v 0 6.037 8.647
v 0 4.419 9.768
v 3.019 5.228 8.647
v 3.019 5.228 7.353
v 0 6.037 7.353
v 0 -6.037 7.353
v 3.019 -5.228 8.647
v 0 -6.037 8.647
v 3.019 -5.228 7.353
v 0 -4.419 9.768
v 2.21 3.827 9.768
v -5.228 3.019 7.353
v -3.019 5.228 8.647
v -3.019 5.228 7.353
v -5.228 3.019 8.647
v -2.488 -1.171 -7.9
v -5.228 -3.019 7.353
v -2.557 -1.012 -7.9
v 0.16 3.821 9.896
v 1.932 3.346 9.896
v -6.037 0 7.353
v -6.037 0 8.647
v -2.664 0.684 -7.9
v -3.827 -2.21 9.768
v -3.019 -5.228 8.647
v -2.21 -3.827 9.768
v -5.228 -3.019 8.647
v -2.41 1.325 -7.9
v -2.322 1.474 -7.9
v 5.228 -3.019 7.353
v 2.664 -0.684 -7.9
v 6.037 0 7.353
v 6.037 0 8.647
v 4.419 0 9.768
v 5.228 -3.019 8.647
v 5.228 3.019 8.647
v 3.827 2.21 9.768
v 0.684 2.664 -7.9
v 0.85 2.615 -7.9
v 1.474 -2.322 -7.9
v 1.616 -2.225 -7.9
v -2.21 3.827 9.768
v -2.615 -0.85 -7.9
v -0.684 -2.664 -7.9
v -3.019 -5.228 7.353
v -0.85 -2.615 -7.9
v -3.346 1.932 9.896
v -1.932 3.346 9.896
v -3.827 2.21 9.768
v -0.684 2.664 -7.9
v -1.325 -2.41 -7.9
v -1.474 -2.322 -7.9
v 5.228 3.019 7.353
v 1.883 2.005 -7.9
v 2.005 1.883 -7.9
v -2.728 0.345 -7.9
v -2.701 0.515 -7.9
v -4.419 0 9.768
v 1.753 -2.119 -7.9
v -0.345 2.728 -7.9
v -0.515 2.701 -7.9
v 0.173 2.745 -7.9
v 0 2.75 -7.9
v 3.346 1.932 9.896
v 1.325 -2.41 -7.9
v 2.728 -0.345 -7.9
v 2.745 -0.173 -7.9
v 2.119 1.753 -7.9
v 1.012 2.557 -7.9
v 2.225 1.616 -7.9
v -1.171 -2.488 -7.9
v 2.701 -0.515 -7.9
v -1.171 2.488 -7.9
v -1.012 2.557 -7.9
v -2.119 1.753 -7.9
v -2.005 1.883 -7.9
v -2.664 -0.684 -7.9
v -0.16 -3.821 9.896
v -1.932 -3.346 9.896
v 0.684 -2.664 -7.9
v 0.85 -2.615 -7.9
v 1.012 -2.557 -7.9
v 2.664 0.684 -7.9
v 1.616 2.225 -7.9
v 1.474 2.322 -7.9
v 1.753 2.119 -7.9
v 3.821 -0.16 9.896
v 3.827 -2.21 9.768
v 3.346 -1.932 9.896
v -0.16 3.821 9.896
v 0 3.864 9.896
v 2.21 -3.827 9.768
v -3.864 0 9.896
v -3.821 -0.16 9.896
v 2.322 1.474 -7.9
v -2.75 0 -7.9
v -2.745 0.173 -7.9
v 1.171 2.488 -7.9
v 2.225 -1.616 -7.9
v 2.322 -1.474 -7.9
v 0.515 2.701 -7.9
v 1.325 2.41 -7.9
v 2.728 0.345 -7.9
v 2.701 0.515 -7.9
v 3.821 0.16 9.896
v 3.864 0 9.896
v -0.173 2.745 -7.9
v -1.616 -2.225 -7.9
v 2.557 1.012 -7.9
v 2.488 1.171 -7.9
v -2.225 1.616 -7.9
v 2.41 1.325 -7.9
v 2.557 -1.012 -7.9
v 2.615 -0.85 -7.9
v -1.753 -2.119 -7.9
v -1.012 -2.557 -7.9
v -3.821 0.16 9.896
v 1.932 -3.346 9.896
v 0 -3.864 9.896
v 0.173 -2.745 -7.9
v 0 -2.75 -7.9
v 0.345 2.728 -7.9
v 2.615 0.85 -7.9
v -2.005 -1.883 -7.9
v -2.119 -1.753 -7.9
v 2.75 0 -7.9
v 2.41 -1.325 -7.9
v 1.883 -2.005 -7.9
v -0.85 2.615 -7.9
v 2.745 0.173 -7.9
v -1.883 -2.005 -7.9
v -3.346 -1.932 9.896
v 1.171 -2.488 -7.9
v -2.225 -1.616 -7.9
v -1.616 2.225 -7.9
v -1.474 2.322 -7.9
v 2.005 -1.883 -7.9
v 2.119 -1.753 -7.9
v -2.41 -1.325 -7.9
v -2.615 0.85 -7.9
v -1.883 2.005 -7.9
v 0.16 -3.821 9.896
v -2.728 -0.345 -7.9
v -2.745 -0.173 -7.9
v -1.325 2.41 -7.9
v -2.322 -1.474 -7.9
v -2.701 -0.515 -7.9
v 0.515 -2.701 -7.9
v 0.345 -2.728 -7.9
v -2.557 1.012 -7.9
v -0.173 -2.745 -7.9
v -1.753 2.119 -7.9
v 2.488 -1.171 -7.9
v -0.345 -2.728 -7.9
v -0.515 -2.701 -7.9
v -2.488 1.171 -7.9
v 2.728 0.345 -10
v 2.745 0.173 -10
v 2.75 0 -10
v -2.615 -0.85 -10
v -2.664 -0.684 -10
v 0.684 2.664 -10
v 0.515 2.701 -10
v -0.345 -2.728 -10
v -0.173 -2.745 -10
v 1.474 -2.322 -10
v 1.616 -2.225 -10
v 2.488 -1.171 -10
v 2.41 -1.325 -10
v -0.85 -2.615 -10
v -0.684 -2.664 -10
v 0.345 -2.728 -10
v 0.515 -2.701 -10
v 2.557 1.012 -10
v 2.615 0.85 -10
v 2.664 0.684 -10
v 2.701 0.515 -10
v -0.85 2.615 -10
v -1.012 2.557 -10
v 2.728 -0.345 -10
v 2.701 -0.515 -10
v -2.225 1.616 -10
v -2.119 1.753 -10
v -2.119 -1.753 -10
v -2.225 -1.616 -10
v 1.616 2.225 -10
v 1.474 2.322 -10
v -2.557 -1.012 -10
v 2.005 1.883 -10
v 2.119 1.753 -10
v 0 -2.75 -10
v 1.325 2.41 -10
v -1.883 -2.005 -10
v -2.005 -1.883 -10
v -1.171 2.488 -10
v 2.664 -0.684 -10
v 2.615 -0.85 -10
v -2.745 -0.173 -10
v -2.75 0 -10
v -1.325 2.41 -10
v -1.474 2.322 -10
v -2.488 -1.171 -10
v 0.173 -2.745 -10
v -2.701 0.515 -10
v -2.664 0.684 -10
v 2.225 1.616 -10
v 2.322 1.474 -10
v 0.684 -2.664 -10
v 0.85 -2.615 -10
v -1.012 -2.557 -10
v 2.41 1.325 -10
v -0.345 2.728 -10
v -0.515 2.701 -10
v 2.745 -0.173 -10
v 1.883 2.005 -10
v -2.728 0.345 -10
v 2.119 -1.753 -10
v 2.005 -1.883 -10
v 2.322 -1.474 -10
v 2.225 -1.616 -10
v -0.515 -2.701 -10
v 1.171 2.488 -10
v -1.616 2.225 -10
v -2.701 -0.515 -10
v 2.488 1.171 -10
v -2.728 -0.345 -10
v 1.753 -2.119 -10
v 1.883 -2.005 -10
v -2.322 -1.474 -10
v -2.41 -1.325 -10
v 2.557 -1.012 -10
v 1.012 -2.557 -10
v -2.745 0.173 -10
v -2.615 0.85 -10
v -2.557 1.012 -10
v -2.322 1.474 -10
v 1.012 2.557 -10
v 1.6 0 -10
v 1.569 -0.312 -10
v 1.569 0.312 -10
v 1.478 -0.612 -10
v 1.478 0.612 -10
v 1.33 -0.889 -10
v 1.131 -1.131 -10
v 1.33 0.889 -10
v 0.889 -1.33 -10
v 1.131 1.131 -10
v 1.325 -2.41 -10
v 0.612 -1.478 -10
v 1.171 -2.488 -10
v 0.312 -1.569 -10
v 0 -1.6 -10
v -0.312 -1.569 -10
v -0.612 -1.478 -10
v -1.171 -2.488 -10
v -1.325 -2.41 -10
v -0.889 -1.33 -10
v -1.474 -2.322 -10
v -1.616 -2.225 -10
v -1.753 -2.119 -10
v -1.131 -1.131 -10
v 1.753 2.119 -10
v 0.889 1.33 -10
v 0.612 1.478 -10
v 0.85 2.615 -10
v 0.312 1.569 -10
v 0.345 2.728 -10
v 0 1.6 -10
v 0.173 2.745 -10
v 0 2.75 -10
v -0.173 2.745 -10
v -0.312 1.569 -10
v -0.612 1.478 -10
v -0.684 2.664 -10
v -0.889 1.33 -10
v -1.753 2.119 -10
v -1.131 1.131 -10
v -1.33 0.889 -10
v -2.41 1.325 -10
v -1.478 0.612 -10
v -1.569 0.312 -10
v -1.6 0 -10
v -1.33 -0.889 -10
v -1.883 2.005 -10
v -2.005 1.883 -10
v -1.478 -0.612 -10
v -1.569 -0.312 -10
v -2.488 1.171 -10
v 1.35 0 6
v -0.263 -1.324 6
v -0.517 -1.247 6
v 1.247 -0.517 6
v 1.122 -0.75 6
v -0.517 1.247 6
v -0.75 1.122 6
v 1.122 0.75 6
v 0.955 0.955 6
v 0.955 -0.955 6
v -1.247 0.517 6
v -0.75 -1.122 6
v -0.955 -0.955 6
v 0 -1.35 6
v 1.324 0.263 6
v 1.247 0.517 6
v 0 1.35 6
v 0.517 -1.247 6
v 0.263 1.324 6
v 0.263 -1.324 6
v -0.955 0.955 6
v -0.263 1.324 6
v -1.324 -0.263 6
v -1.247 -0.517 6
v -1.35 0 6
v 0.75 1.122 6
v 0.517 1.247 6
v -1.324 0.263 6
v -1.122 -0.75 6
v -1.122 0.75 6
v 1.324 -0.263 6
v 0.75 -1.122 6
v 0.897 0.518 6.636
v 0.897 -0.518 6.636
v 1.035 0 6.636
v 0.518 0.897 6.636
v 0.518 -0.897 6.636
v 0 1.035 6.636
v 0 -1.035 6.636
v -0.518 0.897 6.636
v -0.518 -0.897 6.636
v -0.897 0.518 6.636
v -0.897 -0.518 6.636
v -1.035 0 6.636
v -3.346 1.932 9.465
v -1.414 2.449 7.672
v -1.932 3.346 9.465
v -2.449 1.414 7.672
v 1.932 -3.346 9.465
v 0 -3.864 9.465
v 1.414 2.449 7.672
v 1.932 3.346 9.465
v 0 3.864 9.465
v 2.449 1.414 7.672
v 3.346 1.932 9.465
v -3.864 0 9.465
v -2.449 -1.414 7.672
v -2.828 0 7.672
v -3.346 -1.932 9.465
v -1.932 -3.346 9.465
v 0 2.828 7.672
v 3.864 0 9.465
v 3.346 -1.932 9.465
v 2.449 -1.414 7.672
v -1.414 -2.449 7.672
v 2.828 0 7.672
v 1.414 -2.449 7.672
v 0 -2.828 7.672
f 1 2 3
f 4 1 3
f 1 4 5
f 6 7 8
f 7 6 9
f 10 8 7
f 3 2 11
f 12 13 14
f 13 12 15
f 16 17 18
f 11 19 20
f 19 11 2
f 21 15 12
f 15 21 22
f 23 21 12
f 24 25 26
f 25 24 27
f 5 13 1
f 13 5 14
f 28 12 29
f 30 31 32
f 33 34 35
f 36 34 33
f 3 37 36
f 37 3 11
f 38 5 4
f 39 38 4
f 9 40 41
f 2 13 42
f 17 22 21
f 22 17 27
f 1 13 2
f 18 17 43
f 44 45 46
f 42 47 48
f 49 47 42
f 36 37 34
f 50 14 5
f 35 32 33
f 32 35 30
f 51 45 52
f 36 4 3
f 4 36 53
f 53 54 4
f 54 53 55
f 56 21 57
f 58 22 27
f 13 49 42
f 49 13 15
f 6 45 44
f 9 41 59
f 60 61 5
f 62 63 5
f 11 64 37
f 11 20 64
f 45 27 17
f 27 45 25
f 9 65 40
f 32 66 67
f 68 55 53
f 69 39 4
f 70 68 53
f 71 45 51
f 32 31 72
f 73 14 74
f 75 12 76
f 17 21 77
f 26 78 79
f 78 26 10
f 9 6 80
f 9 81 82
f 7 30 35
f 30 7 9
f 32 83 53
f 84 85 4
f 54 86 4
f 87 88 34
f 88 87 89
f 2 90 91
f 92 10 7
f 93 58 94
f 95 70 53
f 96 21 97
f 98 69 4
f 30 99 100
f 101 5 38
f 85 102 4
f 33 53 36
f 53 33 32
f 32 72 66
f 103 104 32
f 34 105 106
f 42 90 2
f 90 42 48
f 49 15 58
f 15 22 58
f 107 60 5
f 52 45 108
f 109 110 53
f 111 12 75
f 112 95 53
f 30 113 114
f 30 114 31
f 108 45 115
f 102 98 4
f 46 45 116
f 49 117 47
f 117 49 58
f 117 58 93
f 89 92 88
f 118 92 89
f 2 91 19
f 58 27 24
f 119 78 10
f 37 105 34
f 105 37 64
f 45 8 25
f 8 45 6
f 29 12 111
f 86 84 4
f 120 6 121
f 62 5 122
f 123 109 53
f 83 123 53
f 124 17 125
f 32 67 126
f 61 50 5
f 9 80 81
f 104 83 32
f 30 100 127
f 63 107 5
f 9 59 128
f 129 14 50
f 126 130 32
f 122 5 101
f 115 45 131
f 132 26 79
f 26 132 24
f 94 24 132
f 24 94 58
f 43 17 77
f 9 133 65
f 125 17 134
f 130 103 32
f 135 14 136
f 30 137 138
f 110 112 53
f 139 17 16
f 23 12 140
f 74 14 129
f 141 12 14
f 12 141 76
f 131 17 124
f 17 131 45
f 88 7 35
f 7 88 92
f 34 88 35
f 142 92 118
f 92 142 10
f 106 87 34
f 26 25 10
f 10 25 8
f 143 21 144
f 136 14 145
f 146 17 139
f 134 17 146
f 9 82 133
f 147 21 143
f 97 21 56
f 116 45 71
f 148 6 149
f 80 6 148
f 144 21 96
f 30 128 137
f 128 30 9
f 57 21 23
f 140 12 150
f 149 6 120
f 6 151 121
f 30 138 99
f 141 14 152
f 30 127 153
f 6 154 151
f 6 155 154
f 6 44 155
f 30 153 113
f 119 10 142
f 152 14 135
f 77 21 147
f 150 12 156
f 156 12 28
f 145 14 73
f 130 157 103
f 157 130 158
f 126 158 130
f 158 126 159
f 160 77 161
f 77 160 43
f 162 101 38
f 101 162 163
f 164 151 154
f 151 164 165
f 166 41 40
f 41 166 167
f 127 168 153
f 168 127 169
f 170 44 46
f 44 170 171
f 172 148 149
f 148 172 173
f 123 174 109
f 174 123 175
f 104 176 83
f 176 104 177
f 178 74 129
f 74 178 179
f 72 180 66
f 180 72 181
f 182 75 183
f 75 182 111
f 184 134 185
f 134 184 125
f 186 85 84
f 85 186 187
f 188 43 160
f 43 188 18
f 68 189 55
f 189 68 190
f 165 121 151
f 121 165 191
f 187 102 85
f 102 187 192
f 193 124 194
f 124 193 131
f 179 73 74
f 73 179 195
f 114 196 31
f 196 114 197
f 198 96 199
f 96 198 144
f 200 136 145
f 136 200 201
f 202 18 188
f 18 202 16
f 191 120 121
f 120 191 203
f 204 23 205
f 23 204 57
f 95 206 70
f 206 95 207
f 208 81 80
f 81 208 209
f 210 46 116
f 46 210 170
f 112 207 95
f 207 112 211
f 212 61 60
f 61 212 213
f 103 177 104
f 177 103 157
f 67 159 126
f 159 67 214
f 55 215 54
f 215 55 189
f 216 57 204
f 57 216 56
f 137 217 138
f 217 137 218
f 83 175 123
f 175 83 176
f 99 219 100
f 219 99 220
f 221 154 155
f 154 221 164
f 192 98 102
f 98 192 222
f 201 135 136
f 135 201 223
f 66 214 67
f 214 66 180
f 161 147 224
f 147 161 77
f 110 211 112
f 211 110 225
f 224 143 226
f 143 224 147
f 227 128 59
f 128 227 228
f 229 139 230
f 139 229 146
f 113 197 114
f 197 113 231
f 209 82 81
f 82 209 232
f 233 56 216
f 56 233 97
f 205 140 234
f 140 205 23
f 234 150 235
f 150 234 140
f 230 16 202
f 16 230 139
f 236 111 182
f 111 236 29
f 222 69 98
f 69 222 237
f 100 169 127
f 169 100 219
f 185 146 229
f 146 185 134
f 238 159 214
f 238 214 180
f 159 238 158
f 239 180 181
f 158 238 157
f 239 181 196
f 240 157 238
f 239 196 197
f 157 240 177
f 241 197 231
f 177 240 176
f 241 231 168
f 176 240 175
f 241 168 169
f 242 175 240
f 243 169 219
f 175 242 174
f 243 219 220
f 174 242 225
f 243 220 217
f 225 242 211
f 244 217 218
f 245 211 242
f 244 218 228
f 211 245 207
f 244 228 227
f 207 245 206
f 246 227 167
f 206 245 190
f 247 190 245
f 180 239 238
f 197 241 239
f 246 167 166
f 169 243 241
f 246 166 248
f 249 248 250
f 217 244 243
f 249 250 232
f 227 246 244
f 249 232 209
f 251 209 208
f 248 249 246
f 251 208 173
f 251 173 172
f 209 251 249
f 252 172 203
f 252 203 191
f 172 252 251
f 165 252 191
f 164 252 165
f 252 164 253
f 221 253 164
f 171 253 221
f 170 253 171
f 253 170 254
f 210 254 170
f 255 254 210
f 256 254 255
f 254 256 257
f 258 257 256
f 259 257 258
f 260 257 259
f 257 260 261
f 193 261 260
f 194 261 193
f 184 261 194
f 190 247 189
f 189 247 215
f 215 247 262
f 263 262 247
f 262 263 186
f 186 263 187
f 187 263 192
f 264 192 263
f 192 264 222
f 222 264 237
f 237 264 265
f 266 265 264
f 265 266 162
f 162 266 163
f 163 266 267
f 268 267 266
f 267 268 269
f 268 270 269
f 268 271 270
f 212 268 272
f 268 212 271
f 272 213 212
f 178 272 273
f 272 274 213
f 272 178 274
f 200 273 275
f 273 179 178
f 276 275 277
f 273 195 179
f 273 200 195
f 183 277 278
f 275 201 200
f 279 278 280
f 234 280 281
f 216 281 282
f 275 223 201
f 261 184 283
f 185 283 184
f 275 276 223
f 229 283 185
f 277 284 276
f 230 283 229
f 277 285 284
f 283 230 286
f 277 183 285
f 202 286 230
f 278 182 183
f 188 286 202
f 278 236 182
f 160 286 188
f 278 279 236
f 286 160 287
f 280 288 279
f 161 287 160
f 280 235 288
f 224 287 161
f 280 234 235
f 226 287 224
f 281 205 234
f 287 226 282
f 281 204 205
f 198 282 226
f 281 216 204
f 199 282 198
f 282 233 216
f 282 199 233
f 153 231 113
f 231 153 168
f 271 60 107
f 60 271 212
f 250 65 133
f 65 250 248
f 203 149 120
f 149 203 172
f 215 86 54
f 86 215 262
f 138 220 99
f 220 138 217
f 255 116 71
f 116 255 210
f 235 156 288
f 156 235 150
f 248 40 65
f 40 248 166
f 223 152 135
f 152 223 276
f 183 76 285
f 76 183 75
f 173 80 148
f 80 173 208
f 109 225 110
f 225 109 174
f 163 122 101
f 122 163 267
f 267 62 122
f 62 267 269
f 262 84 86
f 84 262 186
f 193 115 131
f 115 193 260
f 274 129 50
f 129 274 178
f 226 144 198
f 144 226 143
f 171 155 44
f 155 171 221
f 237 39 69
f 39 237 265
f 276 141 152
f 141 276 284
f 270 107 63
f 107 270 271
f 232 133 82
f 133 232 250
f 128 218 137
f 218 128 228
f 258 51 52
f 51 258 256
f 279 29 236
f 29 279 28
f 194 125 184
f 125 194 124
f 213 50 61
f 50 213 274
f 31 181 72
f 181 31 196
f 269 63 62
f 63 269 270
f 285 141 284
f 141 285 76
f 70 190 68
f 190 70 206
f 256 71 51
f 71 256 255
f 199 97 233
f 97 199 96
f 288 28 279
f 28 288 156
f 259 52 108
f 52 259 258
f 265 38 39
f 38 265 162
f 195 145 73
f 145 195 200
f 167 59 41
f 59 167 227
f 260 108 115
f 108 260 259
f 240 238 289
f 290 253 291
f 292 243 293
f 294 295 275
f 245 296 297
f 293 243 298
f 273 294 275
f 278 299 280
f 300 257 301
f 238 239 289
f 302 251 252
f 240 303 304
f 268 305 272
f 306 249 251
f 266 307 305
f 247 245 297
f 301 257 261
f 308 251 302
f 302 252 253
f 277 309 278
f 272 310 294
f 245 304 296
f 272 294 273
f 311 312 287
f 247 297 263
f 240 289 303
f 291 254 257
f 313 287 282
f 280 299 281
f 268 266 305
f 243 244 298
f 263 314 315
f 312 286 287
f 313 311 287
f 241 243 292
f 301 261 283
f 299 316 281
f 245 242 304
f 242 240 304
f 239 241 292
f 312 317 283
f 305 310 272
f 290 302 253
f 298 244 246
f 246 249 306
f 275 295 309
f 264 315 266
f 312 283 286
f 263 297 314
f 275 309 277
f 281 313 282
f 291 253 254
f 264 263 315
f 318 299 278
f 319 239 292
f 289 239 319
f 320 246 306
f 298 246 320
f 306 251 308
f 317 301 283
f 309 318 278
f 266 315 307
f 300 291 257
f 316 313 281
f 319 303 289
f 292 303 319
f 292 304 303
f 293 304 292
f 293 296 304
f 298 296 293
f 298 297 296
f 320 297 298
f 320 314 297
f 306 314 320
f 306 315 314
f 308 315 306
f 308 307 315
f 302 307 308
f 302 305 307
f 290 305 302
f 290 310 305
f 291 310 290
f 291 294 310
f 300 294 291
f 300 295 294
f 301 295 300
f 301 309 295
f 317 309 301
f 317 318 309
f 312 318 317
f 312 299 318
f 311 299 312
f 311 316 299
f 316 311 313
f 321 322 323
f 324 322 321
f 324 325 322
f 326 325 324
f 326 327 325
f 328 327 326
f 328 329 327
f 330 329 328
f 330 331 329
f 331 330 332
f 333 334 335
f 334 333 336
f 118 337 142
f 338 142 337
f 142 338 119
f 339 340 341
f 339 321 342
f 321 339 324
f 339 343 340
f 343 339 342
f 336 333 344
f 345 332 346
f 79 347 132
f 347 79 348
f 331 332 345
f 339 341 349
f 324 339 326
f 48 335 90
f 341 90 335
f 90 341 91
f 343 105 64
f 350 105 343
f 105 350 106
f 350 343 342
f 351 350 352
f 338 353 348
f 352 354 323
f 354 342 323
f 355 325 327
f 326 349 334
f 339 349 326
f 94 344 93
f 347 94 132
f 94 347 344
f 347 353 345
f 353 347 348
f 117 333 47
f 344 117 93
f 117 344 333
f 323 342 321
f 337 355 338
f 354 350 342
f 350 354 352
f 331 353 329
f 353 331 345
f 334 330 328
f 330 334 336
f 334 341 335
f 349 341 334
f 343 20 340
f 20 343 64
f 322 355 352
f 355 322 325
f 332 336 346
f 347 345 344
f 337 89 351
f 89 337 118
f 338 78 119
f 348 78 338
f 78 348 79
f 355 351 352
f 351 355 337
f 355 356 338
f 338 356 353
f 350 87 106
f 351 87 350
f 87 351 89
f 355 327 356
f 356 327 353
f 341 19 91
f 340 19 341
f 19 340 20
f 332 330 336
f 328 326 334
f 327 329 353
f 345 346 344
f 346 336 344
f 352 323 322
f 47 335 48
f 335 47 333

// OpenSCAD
/*
Customizable Thumbsticks for replacing/improving controllers.

    Harlo ~ 07/05/2016.
*/

//Inside Cut Height
inner_cut_length = 16; //[0:0.5:50]
//Inside Cut Diameter
inner_dia = 3.2; //[0:0.1:10]
//Inside Cut Resolution (4 for square)
inner_resolution = 32; //[4:1:120]

//Collar Height (Lower Cylinder)
lower_length = 4; //[0:0.25:10]
//Collar Diameter (OD)
lower_dia = 5.5; //[1:0.25:20]
//Collar Resolution
collar_resolution = 100; //[4:1:120]

//Overall Height
total_length = 20; //[10:0.25:50]
//Thumbstick Diameter
upper_dia = 12.5; //[5:0.25:25]
//Thumbstick Resolution
thumbstick_resolution = 12; //[8:1:120]

//Thumb Recess Diameter 
dimple_dia = 8; //[0:0.5:20]







upper_length = total_length - lower_length;


difference(){
    thumbstick();
    inner_cutout();
    top_dimple();
}

module inner_cutout(){
    //-inner_cut_length/2
    translate([0,0,-(total_length/2 - inner_cut_length/2)]){
        cylinder(h = inner_cut_length, d1 = inner_dia, d2 = inner_dia - 0.5, center = true, $fn = inner_resolution);
    }
    
}

module top_dimple(){
    translate([0,0,2.5 + upper_length/2]){
        scale([1,1,1]){
            sphere(d = dimple_dia, $fn = thumbstick_resolution, center = true);
        }
    }
}

module thumbstick(){
    upper();
    translate([0,0,-upper_length/2]){
        attachment();
    }
}



module upper(){
    hull(){
        translate([0,0,upper_length/2]){
            scale([1,1,0.4]){
                sphere(d = upper_dia, $fn = thumbstick_resolution);
            }
        }
        
        translate([0,0,-(upper_length/2 - 0.1)]){
        cylinder(h = 0.1, d = lower_dia, $fn = collar_resolution);
        }
    }   
}

module attachment(){

        cylinder(h = lower_length, d = lower_dia, $fn = collar_resolution, center = true);

}
